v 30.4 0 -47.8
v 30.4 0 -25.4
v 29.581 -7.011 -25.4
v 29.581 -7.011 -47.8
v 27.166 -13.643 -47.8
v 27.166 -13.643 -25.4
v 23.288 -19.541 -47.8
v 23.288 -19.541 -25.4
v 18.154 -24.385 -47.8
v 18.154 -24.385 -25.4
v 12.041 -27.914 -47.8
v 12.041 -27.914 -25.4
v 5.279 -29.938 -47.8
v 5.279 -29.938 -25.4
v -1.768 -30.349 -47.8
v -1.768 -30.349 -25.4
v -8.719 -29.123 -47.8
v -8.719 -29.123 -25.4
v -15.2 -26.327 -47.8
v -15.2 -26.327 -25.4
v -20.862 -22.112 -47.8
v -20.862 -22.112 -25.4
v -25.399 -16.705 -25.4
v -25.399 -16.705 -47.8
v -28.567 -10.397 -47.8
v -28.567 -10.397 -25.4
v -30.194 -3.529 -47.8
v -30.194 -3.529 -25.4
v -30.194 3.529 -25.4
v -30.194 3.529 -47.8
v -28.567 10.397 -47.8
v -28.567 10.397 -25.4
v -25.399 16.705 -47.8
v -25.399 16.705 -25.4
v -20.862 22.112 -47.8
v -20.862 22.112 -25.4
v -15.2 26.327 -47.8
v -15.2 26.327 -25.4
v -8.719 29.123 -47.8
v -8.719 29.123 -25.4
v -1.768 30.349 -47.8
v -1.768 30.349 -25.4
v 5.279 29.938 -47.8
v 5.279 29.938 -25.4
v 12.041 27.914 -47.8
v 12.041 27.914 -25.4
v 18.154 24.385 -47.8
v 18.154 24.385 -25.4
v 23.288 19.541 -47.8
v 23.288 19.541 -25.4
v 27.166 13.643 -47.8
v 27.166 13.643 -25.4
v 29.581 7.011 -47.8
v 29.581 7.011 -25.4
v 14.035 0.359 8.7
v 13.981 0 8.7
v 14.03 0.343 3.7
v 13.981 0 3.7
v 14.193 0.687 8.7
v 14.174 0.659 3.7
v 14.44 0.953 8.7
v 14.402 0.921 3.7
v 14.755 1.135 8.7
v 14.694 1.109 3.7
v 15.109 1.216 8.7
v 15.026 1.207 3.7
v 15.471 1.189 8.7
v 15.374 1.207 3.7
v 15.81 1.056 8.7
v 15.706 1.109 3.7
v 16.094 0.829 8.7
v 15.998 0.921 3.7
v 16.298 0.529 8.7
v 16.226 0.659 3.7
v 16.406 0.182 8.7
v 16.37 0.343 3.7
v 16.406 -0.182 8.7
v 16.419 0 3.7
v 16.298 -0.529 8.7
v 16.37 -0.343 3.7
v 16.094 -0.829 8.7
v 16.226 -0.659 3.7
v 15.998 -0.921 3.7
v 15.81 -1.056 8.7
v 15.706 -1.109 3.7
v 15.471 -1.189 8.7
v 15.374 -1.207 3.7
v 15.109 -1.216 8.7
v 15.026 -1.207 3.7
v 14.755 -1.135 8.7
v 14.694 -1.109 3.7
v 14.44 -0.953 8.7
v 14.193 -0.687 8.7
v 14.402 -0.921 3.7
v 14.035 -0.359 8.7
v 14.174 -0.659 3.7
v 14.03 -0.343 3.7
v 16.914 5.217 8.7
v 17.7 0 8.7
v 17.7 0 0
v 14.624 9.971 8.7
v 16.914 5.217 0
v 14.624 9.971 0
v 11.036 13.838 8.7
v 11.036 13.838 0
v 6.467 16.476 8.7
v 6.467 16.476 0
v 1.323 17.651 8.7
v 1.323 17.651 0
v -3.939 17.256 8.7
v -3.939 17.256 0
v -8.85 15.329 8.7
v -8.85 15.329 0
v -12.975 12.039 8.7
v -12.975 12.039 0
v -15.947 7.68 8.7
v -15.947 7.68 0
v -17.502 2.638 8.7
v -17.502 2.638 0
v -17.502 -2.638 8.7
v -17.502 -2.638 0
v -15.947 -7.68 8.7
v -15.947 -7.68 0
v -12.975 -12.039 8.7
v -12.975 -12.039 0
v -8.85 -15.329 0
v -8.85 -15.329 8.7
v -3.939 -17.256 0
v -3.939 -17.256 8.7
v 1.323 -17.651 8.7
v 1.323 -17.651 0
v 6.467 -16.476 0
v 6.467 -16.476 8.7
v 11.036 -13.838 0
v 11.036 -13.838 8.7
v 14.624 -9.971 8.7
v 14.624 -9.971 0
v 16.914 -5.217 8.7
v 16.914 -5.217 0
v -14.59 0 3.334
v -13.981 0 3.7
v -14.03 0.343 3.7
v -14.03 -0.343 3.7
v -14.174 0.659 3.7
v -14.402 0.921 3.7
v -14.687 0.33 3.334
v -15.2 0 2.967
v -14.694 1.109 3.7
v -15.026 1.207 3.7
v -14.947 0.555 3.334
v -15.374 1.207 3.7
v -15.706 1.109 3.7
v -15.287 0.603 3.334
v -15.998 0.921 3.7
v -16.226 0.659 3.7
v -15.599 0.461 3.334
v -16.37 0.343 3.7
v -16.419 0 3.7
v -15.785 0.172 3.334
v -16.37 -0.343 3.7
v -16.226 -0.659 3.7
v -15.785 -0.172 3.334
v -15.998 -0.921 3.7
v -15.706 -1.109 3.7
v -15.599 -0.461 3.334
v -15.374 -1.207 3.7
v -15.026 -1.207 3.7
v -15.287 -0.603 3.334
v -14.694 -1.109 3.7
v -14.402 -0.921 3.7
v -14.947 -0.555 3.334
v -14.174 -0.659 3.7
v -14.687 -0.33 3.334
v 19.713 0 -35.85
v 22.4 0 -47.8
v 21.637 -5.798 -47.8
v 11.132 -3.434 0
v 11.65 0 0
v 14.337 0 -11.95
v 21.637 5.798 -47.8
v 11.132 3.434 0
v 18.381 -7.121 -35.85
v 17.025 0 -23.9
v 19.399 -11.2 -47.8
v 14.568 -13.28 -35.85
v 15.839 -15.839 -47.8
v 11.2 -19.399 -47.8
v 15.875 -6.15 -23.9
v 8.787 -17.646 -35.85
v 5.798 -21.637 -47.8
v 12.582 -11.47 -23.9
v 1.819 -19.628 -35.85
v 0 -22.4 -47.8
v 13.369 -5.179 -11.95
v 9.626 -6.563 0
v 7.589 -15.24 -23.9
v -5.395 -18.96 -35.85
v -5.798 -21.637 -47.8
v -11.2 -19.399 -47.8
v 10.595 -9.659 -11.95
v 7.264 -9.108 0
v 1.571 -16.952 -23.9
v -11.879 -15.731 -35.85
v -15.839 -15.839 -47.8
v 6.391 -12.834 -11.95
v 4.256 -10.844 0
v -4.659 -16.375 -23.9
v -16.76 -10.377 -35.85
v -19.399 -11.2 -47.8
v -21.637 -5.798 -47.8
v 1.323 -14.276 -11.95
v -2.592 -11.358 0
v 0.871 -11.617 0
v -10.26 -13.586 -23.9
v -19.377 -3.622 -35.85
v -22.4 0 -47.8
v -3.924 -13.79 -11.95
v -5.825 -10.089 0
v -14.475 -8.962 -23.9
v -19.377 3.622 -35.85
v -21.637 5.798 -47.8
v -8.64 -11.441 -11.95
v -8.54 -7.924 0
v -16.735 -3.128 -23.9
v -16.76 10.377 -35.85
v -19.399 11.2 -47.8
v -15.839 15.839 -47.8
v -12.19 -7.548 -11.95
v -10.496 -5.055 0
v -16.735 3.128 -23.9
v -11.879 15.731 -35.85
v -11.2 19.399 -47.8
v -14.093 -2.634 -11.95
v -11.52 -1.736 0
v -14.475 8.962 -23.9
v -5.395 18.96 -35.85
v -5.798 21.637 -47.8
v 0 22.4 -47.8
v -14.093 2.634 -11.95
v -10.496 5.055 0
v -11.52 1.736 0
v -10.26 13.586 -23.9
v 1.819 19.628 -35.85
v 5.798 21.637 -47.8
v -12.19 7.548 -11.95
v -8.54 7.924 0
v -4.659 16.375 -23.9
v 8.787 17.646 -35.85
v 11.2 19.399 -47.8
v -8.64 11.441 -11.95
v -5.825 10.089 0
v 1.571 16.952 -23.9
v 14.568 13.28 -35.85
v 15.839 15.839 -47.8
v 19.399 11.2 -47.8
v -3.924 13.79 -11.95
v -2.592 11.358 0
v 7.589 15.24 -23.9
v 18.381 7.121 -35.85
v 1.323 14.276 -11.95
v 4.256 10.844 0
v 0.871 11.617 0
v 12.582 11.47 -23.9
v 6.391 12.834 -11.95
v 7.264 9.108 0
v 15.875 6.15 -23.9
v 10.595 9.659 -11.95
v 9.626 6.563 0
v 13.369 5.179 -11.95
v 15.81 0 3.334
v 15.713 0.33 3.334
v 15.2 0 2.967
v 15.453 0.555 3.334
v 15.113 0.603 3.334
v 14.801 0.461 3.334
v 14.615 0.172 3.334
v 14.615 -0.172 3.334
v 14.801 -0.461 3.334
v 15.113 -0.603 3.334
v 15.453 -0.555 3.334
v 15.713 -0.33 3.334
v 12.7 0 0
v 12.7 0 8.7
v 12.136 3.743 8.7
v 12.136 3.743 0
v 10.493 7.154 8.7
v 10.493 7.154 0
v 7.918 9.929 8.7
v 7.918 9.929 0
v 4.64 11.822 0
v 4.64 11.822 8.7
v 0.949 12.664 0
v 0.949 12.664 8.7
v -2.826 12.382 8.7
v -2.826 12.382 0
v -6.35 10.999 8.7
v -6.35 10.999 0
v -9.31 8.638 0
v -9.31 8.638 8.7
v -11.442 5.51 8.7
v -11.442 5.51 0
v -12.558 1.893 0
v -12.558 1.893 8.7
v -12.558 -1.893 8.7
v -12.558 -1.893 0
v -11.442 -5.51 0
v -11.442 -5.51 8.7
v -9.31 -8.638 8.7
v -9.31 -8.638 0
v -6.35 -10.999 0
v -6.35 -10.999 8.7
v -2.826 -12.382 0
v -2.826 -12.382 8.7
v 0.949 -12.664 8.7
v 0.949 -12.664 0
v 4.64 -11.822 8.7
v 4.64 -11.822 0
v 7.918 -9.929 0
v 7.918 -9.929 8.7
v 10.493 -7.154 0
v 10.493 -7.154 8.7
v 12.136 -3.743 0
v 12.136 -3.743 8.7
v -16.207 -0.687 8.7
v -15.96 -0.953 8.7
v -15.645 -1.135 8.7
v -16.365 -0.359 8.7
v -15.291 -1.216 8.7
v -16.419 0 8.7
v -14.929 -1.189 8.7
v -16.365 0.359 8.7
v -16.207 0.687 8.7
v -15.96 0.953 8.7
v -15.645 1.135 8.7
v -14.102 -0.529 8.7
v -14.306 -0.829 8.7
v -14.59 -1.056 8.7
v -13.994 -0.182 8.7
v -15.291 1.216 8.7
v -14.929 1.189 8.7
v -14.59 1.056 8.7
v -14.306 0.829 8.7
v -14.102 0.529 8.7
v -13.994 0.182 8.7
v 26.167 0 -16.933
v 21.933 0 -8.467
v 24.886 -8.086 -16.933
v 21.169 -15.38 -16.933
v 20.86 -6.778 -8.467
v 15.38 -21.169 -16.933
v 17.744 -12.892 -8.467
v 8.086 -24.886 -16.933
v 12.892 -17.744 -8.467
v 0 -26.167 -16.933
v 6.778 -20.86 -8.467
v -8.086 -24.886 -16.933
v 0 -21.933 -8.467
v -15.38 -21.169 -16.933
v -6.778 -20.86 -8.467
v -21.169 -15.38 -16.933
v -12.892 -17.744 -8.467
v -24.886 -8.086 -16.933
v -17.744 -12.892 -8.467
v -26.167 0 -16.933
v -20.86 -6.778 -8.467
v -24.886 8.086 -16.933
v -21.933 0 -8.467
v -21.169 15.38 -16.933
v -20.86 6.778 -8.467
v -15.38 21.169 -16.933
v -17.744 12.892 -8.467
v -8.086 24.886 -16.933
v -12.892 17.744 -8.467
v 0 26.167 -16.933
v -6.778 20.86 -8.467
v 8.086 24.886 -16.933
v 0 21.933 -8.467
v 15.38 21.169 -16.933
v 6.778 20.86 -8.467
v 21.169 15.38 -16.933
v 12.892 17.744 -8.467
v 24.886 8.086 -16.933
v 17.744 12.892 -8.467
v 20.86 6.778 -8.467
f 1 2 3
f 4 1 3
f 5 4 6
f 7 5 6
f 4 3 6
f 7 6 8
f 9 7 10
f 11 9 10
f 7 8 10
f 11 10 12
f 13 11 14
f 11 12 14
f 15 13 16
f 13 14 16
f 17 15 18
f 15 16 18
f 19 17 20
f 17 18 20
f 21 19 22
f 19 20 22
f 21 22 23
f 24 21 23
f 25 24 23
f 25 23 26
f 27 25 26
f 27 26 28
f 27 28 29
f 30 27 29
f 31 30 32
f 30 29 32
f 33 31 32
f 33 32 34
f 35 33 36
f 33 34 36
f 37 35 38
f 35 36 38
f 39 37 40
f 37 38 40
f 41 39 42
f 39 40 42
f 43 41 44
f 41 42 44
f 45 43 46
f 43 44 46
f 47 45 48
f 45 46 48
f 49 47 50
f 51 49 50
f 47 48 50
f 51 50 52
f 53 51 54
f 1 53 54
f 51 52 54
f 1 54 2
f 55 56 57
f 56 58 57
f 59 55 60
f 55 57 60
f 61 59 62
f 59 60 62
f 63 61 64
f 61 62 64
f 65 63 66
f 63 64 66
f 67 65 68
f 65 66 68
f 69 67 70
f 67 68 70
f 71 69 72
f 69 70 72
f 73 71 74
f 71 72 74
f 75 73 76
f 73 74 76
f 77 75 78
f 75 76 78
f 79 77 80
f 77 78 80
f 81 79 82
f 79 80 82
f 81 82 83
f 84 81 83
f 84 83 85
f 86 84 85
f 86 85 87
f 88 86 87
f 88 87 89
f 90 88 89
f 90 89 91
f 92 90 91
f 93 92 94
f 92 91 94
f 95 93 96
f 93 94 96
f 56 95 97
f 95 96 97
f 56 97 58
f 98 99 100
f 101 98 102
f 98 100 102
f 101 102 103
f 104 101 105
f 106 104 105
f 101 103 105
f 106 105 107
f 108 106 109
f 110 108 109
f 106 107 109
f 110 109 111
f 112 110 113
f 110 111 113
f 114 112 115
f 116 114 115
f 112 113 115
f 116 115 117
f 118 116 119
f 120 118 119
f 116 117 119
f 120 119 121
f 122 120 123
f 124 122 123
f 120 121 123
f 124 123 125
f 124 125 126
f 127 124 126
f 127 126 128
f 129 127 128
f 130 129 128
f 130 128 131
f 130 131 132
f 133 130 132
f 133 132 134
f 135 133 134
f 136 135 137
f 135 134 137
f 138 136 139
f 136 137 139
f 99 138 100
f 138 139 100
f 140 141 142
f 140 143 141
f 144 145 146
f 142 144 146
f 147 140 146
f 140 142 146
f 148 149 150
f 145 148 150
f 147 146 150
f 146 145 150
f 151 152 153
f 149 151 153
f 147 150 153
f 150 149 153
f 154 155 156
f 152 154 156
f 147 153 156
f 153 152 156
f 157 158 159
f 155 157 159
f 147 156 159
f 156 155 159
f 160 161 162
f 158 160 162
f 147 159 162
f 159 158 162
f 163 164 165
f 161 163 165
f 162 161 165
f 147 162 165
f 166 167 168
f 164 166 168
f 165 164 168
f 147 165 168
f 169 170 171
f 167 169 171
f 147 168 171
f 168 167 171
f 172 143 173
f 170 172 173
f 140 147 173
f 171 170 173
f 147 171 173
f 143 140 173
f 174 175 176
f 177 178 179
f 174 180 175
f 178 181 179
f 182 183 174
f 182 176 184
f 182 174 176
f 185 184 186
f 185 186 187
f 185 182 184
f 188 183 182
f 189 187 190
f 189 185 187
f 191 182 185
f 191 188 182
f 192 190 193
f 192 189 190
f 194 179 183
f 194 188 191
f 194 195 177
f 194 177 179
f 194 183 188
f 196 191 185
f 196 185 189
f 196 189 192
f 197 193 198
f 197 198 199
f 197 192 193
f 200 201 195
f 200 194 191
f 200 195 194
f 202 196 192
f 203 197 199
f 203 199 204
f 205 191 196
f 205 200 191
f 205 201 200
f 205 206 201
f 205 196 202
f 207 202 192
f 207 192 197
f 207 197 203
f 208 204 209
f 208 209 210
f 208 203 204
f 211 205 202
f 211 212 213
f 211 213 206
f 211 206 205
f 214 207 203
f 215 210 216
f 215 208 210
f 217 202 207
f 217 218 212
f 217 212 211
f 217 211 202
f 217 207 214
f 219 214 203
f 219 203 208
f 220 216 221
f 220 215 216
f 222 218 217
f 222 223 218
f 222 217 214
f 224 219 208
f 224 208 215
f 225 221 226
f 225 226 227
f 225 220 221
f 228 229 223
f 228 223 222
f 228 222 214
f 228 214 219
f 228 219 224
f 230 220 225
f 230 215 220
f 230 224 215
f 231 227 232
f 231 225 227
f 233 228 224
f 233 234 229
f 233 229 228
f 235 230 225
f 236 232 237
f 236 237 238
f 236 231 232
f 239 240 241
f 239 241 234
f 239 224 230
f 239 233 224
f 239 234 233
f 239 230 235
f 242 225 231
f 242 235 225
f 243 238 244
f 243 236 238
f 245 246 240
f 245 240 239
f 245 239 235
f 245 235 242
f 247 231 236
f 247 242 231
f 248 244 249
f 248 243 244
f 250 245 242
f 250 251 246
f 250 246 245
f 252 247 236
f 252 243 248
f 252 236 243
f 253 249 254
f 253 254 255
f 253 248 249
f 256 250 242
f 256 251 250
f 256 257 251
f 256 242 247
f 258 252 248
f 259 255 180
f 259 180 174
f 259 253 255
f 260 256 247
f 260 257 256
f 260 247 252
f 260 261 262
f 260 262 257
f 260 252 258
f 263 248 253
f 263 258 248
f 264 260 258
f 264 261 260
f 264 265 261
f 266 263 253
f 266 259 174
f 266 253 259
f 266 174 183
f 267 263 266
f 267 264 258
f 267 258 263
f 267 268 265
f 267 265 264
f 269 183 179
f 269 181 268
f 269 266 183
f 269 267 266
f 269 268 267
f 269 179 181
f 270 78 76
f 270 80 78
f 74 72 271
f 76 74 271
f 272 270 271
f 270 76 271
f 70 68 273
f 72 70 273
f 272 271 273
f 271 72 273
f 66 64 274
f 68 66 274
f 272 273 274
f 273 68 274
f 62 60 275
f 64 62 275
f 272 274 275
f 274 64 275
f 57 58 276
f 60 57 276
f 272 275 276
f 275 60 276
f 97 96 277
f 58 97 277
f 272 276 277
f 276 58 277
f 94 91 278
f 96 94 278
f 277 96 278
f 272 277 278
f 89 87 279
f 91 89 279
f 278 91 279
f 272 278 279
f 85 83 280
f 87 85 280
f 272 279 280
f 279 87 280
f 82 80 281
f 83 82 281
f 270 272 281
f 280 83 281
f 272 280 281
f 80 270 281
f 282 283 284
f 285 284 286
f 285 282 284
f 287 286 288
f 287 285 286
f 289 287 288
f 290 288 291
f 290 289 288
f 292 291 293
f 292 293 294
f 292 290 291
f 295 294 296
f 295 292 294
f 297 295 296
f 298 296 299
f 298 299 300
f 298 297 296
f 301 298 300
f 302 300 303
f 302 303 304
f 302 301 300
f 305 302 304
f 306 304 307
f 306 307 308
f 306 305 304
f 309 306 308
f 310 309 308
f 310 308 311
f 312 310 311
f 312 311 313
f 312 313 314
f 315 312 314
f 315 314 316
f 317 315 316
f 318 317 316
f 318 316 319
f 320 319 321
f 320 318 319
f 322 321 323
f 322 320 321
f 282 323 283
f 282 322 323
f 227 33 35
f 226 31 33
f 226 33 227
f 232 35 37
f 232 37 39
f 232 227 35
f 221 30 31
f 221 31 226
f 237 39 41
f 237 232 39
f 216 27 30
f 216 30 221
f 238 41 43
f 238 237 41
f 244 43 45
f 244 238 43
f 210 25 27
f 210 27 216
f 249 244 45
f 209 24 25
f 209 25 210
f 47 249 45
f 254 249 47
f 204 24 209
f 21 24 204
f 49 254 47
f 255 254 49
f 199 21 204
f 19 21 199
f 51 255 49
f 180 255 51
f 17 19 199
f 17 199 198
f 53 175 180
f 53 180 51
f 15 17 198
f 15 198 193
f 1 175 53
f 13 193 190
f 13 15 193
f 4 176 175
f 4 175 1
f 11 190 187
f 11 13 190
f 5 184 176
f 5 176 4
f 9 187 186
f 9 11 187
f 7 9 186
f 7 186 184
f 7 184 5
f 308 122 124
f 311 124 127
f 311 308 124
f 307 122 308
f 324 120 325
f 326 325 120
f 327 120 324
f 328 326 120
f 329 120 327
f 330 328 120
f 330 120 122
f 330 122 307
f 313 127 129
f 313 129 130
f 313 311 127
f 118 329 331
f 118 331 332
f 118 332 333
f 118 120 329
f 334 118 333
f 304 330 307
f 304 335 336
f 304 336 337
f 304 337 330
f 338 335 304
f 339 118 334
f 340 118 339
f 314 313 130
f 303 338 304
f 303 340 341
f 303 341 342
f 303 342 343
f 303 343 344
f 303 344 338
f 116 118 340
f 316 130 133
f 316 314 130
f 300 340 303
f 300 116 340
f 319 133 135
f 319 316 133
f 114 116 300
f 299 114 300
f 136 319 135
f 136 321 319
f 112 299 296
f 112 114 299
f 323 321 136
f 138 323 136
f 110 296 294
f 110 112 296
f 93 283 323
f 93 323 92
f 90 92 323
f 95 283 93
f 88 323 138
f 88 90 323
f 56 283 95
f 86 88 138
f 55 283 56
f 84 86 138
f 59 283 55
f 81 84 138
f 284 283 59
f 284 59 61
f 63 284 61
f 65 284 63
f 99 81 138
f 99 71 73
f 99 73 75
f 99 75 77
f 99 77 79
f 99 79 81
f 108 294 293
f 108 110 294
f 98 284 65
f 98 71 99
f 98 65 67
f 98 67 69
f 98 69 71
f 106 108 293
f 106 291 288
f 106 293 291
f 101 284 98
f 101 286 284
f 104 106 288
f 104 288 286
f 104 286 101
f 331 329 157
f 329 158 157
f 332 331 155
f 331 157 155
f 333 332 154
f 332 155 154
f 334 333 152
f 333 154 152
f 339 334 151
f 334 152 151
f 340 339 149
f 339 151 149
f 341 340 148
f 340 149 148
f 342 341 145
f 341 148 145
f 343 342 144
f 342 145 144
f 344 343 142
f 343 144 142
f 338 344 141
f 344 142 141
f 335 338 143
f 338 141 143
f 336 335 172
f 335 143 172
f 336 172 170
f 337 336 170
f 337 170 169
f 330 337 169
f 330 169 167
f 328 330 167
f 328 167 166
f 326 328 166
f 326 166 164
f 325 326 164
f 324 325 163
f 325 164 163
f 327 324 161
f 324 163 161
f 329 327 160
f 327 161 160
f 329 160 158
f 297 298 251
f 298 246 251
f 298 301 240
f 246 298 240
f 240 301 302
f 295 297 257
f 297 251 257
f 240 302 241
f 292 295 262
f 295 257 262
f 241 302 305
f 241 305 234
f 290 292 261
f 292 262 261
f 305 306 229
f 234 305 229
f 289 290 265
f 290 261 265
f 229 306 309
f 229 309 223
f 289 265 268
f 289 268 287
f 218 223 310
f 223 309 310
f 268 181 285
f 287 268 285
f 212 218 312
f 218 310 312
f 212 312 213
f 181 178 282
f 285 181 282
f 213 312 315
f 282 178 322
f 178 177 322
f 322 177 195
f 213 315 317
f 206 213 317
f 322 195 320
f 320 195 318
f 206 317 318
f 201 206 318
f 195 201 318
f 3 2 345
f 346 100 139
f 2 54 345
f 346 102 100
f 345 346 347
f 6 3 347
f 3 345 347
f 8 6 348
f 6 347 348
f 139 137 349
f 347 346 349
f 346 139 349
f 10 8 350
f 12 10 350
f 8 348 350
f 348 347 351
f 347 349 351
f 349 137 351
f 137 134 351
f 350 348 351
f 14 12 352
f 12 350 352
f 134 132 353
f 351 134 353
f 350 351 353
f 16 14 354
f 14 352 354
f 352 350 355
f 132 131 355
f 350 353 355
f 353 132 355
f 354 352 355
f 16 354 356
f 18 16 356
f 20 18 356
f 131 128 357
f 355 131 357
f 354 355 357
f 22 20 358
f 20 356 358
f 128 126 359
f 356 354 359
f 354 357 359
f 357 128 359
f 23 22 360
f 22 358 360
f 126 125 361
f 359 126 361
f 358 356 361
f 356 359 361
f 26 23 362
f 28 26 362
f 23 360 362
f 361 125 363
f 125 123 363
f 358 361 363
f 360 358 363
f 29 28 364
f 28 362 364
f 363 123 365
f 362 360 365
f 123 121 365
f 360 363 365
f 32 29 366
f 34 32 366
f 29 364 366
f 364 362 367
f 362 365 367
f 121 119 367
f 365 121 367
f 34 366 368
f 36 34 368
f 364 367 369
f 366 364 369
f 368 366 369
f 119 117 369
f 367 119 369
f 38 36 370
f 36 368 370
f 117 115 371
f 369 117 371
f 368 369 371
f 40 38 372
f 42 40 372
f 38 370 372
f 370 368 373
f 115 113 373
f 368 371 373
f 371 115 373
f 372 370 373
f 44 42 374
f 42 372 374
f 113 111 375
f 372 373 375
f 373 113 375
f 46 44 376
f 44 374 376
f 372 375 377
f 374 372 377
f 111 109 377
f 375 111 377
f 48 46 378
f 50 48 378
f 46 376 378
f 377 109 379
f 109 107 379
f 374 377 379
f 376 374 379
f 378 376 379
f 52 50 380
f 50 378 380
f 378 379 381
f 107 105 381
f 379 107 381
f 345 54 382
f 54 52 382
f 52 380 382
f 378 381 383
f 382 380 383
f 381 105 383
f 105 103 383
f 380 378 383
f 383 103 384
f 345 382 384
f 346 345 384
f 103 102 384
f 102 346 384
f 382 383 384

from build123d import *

# Parameters (mm, degrees)
ESQUISSE1_R                     = 17.7
ESQUISSE1_R_2                   = 12.7
BOSS_EXTRU_1_DEPTH              = 8.7
ESQUISSE2_R                     = 30.4
ESQUISSE2_R_2                   = 11.2
BOSS_EXTRU_2_DEPTH              = 47.8
CHANFREIN1_SIZE                 = 25.4
CHANFREIN1_SIZE2                = 12.699971641
CHANFREIN3_SIZE                 = 11.200084029
CHANFREIN3_SIZE_2               = 49.8
F_41_0_096_DIAMETER_HOLE1_D     = 2.4384
F_41_0_096_DIAMETER_HOLE1_DEPTH = 5
F_41_0_096_DIAMETER_HOLE1_TIP   = 0.732569267


with BuildPart() as part:
    # Esquisse1 → Boss.-Extru.1 (new body)
    with BuildSketch(Plane.XY):
        Circle(ESQUISSE1_R)
        Circle(ESQUISSE1_R_2, mode=Mode.SUBTRACT)
    extrude(amount=BOSS_EXTRU_1_DEPTH)

    # Esquisse2 → Boss.-Extru.2 (add)
    with BuildSketch(Plane(origin=(0, 0, 0), x_dir=(-1, 0, 0), z_dir=(0, 0, -1))):
        with Locations(Location((0, 0, 0), (0, 0, 180))):
            Circle(ESQUISSE2_R)
        with Locations(Location((0, 0, 0), (0, 0, 180))):
            Circle(ESQUISSE2_R_2, mode=Mode.SUBTRACT)
    extrude(amount=BOSS_EXTRU_2_DEPTH)

    # Chanfrein1
    chanfrein1_edges = [part.edges().sort_by_distance(p)[0] for p in [
        (-30.4, 0, 0),
    ]]
    chanfrein1_side = [part.faces().sort_by_distance(p)[0] for p in [
        (-30.4, 0, -23.9),
    ]]
    chamfer(chanfrein1_edges, length=CHANFREIN1_SIZE, length2=CHANFREIN1_SIZE2, reference=chanfrein1_side[0])

    # Chanfrein3
    # the kernel refuses this chamfer: 49.8, 11.200084029 mm, written as the material it takes off along each edge
    with BuildSketch(Plane(origin=(0, 0, -47.8), x_dir=(1, 0, 0), z_dir=(0, 1, 0))) as chanfrein3_piece_1:
        Polygon((11.2 + CHANFREIN3_SIZE, 0), (11.2, -CHANFREIN3_SIZE_2), (11.2, 0), align=None)
    revolve(axis=Axis((0, 0, -47.8), (0, 0, -1)), mode=Mode.SUBTRACT)

    # #41 (0.096) Diameter Hole1
    with Locations(Plane.XY.offset(8.7)):
        with Locations((-15.2, 0), (15.2, 0)):
            Hole(F_41_0_096_DIAMETER_HOLE1_D / 2, depth=F_41_0_096_DIAMETER_HOLE1_DEPTH)
            with Locations((0, 0, -(F_41_0_096_DIAMETER_HOLE1_DEPTH + F_41_0_096_DIAMETER_HOLE1_TIP / 2))):  # 118° drill point
                Cone(0, F_41_0_096_DIAMETER_HOLE1_D / 2, F_41_0_096_DIAMETER_HOLE1_TIP, mode=Mode.SUBTRACT)


solid = part.part
